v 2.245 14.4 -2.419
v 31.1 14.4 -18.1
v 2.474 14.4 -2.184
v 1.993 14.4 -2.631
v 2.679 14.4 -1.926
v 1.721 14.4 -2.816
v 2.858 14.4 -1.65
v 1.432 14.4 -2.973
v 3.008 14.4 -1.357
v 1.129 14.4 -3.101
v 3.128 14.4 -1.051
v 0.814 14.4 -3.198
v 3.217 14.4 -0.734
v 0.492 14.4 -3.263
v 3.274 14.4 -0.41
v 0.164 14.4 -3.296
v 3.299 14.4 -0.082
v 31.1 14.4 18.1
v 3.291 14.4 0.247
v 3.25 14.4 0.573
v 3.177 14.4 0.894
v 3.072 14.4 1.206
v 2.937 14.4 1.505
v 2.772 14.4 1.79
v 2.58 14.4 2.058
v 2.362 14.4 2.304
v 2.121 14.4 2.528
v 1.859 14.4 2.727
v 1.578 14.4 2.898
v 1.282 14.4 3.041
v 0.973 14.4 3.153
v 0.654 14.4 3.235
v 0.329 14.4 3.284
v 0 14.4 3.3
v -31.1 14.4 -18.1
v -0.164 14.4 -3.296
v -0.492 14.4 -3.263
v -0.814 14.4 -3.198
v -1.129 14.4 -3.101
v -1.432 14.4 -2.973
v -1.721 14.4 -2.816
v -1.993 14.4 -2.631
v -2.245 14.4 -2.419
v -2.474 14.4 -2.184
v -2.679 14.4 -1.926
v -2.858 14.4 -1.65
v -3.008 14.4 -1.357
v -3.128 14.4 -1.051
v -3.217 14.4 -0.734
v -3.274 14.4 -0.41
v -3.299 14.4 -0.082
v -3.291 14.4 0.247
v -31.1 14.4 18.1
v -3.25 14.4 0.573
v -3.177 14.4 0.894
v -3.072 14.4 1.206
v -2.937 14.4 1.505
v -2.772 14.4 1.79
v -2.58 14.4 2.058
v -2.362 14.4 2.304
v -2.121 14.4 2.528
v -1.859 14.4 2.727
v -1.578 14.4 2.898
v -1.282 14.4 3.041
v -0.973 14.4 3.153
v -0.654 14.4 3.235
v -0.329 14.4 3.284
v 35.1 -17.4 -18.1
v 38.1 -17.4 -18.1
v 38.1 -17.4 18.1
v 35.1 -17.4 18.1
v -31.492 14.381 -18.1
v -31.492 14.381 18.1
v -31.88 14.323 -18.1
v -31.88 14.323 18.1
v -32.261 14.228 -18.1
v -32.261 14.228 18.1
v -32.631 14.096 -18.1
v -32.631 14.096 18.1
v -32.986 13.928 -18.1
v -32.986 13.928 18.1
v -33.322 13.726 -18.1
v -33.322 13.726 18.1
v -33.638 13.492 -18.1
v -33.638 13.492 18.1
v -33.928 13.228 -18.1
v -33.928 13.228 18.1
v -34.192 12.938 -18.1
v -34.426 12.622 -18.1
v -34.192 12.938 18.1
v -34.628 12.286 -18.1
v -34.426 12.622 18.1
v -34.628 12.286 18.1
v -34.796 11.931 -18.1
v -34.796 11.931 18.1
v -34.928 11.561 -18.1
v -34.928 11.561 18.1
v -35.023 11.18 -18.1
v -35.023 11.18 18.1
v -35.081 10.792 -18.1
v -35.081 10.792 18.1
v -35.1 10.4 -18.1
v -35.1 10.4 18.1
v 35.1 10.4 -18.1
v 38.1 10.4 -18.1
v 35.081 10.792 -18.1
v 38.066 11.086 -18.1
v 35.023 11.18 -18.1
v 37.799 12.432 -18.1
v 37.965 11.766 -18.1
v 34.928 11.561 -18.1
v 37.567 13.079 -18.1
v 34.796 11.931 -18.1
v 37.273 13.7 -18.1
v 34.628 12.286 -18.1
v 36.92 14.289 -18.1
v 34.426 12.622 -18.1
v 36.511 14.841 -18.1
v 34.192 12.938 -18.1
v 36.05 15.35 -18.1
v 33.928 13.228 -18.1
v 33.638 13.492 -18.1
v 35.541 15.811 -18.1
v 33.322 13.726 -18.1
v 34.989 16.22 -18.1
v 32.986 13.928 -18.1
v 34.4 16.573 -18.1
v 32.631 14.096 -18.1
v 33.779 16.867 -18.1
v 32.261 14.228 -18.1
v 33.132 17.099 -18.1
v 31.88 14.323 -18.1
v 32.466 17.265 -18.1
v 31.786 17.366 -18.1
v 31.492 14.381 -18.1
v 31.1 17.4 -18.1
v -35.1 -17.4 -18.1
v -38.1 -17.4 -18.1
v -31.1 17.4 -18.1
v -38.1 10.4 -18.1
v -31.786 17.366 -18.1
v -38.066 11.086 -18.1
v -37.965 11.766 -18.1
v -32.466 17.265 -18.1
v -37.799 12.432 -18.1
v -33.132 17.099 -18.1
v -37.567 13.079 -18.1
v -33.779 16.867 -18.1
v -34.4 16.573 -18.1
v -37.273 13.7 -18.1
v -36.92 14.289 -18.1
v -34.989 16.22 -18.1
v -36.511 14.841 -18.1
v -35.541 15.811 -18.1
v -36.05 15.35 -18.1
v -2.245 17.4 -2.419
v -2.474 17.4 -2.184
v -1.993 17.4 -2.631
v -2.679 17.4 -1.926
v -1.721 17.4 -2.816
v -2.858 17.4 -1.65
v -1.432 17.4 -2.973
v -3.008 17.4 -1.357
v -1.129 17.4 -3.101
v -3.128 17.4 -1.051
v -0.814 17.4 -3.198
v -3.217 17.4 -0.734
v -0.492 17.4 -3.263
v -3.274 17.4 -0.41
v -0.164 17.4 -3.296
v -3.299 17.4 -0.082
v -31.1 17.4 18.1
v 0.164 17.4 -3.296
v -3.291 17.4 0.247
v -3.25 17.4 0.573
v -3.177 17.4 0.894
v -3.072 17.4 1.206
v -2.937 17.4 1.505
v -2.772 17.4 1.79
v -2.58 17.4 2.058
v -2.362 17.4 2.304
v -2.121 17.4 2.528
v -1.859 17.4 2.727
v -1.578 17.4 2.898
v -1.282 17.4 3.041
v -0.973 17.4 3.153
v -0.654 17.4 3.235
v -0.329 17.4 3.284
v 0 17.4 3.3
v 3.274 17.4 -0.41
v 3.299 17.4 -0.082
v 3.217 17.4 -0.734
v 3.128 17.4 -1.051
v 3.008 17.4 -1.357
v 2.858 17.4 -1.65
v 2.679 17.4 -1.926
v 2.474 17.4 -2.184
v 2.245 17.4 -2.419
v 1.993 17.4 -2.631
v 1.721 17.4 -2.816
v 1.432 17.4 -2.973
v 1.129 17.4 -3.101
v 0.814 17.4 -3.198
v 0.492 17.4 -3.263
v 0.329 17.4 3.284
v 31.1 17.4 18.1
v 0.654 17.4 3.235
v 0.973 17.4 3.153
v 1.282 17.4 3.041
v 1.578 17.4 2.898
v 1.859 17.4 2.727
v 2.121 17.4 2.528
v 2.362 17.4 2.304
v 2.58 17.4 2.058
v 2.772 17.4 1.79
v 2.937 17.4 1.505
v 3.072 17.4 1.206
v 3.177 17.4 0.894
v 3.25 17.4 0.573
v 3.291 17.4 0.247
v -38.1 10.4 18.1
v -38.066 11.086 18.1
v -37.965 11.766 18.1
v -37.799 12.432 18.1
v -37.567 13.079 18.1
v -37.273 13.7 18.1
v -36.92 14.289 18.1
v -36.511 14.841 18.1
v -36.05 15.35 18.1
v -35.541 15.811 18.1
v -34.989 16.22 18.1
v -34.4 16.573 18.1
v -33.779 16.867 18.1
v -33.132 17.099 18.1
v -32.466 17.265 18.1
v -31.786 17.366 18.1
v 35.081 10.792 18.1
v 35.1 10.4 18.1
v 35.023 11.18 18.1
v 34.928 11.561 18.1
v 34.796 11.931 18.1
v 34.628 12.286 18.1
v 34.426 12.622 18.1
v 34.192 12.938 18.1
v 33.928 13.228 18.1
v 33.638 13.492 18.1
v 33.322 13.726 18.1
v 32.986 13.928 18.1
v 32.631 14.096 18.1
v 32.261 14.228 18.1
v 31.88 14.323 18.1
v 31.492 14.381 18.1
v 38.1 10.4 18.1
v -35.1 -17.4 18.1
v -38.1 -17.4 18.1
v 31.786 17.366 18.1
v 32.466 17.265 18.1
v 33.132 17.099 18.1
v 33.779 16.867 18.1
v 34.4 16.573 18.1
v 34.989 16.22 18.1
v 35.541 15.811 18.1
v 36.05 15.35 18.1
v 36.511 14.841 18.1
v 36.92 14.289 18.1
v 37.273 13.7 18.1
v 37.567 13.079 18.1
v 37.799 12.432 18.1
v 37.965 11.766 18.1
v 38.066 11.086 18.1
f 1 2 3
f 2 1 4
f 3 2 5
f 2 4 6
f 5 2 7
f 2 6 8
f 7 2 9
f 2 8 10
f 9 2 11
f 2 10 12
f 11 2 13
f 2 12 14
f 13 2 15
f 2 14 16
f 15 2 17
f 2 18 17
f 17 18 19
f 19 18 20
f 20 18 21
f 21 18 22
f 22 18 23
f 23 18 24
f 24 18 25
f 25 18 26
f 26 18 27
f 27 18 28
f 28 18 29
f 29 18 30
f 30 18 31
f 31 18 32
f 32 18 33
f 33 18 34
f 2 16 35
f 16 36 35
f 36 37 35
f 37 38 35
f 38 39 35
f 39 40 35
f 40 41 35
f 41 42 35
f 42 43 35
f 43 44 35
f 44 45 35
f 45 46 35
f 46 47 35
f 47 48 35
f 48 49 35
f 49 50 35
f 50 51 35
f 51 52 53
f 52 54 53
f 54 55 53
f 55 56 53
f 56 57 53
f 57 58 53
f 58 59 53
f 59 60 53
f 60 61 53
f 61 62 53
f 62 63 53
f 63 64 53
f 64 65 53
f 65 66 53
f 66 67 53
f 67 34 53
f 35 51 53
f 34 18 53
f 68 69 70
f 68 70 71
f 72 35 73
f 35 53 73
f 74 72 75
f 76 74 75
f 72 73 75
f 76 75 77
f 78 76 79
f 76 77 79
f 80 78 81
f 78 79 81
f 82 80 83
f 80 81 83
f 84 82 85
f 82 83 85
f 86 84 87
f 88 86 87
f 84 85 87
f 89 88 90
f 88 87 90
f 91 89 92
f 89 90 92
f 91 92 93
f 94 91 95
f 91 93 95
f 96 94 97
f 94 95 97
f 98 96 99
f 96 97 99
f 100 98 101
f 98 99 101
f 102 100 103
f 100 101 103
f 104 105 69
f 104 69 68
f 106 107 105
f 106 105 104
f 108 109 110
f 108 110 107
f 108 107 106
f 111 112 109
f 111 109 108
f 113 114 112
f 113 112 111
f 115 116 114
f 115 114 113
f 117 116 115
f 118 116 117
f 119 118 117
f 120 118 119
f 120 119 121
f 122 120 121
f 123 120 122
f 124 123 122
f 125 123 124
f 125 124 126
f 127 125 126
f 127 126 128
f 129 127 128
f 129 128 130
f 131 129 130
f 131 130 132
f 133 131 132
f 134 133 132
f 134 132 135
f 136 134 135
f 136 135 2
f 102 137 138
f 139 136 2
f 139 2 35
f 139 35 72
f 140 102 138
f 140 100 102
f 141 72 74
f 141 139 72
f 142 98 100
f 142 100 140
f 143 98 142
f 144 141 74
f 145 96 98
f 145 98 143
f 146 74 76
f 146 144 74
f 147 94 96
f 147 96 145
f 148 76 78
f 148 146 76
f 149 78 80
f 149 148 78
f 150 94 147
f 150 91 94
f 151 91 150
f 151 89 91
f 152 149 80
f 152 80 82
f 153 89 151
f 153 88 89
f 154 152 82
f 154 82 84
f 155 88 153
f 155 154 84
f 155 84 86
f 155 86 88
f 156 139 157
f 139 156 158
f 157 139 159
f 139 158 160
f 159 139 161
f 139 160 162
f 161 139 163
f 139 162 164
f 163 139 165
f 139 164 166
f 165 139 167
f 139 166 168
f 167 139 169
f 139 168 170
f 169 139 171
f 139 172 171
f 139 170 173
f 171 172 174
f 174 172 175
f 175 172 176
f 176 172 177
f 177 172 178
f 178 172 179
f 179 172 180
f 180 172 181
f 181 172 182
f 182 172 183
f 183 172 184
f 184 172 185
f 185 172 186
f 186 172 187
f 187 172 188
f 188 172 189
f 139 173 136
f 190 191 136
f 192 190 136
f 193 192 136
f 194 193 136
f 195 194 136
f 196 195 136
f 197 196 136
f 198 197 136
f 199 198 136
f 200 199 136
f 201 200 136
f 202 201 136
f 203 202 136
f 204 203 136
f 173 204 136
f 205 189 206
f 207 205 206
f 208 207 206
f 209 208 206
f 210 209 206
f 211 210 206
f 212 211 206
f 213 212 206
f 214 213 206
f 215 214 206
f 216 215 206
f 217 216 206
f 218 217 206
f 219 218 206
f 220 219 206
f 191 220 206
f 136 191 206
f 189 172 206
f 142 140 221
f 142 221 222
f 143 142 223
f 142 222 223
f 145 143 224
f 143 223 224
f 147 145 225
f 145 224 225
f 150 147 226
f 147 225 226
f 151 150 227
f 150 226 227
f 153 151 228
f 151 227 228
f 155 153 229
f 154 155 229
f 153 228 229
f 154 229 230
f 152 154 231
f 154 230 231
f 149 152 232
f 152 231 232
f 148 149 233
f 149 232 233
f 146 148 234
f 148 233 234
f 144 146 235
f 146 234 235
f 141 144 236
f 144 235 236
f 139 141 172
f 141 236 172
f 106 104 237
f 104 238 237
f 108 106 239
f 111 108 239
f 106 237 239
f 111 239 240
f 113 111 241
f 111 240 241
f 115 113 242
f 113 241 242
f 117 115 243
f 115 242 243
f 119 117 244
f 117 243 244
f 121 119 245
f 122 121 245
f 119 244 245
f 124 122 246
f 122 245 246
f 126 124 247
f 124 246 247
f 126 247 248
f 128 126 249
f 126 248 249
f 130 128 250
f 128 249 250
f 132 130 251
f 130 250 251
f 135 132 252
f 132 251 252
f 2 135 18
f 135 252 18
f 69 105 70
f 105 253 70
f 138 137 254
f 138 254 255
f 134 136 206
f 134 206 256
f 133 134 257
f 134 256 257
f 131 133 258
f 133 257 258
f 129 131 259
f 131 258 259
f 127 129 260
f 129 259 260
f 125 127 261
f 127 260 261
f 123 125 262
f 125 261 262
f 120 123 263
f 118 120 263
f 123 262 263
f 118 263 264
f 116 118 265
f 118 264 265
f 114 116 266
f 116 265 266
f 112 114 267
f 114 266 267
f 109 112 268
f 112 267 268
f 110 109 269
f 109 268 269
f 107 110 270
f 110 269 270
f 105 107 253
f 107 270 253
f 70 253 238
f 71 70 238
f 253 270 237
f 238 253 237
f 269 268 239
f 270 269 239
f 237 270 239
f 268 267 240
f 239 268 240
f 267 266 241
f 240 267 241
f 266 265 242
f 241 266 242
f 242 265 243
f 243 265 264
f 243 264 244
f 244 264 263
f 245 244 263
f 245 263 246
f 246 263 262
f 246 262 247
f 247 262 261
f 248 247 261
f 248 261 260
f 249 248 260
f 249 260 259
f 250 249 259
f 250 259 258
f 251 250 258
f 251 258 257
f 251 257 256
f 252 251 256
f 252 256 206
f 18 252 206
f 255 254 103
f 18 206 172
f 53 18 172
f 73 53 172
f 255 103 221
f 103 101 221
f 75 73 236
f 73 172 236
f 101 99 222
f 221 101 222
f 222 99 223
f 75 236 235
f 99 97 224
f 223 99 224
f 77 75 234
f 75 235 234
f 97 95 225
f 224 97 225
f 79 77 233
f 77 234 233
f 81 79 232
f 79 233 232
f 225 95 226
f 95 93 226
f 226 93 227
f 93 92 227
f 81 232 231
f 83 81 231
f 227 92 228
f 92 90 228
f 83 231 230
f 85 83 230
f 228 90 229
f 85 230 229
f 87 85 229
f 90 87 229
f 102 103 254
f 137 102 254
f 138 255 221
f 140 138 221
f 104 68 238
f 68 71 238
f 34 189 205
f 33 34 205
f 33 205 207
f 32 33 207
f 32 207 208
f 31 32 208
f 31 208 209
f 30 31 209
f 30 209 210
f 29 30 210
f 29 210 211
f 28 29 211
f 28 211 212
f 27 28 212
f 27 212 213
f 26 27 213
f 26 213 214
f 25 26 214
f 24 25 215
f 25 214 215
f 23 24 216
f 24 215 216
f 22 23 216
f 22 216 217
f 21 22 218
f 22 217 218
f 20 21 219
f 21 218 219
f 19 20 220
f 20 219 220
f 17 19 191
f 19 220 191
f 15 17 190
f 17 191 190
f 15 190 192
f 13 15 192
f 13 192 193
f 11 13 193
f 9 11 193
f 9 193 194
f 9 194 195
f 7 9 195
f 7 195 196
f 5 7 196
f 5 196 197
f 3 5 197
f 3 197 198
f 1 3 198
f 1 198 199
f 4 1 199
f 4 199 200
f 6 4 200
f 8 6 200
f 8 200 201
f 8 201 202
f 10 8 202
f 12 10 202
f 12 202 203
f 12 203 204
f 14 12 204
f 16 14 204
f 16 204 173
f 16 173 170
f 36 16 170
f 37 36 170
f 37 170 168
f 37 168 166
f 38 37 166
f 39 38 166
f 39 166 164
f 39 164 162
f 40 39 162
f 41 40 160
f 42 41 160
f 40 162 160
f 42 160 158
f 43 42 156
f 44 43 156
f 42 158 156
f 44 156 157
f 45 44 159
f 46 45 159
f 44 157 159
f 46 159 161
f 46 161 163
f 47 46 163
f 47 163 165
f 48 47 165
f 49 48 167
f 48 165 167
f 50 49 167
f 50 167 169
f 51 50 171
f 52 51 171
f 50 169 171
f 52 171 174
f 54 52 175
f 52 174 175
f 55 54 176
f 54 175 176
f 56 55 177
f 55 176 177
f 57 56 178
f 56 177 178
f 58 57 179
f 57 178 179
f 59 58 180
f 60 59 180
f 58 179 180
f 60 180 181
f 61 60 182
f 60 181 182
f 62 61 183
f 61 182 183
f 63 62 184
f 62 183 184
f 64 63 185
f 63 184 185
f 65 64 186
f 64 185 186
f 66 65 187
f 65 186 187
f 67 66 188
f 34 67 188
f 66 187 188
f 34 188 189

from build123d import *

# Parameters (mm, degrees)
BASE_FLANGE1_DEPTH = 18.1
CUT_EXTRUDE1_REACH = 56.683
SKETCH6_R          = 3.3


# Sheet-metal steps are written as plain solids
with BuildPart() as part:
    # Sketch1 → Base-Flange1 (new, symmetric)
    with BuildSketch(Plane.XY):
        with BuildLine():
            Line((-38.1, -17.4), (-38.1, 10.4))
            ThreePointArc((-38.1, 10.4), (-36.049747468, 15.349747468), (-31.1, 17.4))
            Line((-31.1, 17.4), (31.1, 17.4))
            ThreePointArc((31.1, 17.4), (36.049747468, 15.349747468), (38.1, 10.4))
            Line((38.1, 10.4), (38.1, -17.4))
            Line((38.1, -17.4), (35.1, -17.4))
            Line((35.1, -17.4), (35.1, 10.4))
            ThreePointArc((35.1, 10.4), (33.928427125, 13.228427125), (31.1, 14.4))
            Line((31.1, 14.4), (-31.1, 14.4))
            ThreePointArc((-31.1, 14.4), (-33.928427125, 13.228427125), (-35.1, 10.4))
            Line((-35.1, 10.4), (-35.1, -17.4))
            Line((-35.1, -17.4), (-38.1, -17.4))
        make_face()
    extrude(amount=BASE_FLANGE1_DEPTH, both=True)

    # Sketch6 → Cut-Extrude1 (cut, up to next)
    with BuildSketch(Plane(origin=(0, 17.4, 0), x_dir=(1, 0, 0), z_dir=(0, 1, 0)), mode=Mode.PRIVATE) as cut_extrude1_sk1:
        with Locations(Location((0, 0, 0), (0, 0, 270))):
            Circle(SKETCH6_R)
    cut_extrude1_tool1 = extrude(cut_extrude1_sk1.sketch, amount=-CUT_EXTRUDE1_REACH, mode=Mode.PRIVATE) & part.part
    add(cut_extrude1_tool1.solids().sort_by_distance((0, 17.4, 0))[0], mode=Mode.SUBTRACT)


solid = part.part
